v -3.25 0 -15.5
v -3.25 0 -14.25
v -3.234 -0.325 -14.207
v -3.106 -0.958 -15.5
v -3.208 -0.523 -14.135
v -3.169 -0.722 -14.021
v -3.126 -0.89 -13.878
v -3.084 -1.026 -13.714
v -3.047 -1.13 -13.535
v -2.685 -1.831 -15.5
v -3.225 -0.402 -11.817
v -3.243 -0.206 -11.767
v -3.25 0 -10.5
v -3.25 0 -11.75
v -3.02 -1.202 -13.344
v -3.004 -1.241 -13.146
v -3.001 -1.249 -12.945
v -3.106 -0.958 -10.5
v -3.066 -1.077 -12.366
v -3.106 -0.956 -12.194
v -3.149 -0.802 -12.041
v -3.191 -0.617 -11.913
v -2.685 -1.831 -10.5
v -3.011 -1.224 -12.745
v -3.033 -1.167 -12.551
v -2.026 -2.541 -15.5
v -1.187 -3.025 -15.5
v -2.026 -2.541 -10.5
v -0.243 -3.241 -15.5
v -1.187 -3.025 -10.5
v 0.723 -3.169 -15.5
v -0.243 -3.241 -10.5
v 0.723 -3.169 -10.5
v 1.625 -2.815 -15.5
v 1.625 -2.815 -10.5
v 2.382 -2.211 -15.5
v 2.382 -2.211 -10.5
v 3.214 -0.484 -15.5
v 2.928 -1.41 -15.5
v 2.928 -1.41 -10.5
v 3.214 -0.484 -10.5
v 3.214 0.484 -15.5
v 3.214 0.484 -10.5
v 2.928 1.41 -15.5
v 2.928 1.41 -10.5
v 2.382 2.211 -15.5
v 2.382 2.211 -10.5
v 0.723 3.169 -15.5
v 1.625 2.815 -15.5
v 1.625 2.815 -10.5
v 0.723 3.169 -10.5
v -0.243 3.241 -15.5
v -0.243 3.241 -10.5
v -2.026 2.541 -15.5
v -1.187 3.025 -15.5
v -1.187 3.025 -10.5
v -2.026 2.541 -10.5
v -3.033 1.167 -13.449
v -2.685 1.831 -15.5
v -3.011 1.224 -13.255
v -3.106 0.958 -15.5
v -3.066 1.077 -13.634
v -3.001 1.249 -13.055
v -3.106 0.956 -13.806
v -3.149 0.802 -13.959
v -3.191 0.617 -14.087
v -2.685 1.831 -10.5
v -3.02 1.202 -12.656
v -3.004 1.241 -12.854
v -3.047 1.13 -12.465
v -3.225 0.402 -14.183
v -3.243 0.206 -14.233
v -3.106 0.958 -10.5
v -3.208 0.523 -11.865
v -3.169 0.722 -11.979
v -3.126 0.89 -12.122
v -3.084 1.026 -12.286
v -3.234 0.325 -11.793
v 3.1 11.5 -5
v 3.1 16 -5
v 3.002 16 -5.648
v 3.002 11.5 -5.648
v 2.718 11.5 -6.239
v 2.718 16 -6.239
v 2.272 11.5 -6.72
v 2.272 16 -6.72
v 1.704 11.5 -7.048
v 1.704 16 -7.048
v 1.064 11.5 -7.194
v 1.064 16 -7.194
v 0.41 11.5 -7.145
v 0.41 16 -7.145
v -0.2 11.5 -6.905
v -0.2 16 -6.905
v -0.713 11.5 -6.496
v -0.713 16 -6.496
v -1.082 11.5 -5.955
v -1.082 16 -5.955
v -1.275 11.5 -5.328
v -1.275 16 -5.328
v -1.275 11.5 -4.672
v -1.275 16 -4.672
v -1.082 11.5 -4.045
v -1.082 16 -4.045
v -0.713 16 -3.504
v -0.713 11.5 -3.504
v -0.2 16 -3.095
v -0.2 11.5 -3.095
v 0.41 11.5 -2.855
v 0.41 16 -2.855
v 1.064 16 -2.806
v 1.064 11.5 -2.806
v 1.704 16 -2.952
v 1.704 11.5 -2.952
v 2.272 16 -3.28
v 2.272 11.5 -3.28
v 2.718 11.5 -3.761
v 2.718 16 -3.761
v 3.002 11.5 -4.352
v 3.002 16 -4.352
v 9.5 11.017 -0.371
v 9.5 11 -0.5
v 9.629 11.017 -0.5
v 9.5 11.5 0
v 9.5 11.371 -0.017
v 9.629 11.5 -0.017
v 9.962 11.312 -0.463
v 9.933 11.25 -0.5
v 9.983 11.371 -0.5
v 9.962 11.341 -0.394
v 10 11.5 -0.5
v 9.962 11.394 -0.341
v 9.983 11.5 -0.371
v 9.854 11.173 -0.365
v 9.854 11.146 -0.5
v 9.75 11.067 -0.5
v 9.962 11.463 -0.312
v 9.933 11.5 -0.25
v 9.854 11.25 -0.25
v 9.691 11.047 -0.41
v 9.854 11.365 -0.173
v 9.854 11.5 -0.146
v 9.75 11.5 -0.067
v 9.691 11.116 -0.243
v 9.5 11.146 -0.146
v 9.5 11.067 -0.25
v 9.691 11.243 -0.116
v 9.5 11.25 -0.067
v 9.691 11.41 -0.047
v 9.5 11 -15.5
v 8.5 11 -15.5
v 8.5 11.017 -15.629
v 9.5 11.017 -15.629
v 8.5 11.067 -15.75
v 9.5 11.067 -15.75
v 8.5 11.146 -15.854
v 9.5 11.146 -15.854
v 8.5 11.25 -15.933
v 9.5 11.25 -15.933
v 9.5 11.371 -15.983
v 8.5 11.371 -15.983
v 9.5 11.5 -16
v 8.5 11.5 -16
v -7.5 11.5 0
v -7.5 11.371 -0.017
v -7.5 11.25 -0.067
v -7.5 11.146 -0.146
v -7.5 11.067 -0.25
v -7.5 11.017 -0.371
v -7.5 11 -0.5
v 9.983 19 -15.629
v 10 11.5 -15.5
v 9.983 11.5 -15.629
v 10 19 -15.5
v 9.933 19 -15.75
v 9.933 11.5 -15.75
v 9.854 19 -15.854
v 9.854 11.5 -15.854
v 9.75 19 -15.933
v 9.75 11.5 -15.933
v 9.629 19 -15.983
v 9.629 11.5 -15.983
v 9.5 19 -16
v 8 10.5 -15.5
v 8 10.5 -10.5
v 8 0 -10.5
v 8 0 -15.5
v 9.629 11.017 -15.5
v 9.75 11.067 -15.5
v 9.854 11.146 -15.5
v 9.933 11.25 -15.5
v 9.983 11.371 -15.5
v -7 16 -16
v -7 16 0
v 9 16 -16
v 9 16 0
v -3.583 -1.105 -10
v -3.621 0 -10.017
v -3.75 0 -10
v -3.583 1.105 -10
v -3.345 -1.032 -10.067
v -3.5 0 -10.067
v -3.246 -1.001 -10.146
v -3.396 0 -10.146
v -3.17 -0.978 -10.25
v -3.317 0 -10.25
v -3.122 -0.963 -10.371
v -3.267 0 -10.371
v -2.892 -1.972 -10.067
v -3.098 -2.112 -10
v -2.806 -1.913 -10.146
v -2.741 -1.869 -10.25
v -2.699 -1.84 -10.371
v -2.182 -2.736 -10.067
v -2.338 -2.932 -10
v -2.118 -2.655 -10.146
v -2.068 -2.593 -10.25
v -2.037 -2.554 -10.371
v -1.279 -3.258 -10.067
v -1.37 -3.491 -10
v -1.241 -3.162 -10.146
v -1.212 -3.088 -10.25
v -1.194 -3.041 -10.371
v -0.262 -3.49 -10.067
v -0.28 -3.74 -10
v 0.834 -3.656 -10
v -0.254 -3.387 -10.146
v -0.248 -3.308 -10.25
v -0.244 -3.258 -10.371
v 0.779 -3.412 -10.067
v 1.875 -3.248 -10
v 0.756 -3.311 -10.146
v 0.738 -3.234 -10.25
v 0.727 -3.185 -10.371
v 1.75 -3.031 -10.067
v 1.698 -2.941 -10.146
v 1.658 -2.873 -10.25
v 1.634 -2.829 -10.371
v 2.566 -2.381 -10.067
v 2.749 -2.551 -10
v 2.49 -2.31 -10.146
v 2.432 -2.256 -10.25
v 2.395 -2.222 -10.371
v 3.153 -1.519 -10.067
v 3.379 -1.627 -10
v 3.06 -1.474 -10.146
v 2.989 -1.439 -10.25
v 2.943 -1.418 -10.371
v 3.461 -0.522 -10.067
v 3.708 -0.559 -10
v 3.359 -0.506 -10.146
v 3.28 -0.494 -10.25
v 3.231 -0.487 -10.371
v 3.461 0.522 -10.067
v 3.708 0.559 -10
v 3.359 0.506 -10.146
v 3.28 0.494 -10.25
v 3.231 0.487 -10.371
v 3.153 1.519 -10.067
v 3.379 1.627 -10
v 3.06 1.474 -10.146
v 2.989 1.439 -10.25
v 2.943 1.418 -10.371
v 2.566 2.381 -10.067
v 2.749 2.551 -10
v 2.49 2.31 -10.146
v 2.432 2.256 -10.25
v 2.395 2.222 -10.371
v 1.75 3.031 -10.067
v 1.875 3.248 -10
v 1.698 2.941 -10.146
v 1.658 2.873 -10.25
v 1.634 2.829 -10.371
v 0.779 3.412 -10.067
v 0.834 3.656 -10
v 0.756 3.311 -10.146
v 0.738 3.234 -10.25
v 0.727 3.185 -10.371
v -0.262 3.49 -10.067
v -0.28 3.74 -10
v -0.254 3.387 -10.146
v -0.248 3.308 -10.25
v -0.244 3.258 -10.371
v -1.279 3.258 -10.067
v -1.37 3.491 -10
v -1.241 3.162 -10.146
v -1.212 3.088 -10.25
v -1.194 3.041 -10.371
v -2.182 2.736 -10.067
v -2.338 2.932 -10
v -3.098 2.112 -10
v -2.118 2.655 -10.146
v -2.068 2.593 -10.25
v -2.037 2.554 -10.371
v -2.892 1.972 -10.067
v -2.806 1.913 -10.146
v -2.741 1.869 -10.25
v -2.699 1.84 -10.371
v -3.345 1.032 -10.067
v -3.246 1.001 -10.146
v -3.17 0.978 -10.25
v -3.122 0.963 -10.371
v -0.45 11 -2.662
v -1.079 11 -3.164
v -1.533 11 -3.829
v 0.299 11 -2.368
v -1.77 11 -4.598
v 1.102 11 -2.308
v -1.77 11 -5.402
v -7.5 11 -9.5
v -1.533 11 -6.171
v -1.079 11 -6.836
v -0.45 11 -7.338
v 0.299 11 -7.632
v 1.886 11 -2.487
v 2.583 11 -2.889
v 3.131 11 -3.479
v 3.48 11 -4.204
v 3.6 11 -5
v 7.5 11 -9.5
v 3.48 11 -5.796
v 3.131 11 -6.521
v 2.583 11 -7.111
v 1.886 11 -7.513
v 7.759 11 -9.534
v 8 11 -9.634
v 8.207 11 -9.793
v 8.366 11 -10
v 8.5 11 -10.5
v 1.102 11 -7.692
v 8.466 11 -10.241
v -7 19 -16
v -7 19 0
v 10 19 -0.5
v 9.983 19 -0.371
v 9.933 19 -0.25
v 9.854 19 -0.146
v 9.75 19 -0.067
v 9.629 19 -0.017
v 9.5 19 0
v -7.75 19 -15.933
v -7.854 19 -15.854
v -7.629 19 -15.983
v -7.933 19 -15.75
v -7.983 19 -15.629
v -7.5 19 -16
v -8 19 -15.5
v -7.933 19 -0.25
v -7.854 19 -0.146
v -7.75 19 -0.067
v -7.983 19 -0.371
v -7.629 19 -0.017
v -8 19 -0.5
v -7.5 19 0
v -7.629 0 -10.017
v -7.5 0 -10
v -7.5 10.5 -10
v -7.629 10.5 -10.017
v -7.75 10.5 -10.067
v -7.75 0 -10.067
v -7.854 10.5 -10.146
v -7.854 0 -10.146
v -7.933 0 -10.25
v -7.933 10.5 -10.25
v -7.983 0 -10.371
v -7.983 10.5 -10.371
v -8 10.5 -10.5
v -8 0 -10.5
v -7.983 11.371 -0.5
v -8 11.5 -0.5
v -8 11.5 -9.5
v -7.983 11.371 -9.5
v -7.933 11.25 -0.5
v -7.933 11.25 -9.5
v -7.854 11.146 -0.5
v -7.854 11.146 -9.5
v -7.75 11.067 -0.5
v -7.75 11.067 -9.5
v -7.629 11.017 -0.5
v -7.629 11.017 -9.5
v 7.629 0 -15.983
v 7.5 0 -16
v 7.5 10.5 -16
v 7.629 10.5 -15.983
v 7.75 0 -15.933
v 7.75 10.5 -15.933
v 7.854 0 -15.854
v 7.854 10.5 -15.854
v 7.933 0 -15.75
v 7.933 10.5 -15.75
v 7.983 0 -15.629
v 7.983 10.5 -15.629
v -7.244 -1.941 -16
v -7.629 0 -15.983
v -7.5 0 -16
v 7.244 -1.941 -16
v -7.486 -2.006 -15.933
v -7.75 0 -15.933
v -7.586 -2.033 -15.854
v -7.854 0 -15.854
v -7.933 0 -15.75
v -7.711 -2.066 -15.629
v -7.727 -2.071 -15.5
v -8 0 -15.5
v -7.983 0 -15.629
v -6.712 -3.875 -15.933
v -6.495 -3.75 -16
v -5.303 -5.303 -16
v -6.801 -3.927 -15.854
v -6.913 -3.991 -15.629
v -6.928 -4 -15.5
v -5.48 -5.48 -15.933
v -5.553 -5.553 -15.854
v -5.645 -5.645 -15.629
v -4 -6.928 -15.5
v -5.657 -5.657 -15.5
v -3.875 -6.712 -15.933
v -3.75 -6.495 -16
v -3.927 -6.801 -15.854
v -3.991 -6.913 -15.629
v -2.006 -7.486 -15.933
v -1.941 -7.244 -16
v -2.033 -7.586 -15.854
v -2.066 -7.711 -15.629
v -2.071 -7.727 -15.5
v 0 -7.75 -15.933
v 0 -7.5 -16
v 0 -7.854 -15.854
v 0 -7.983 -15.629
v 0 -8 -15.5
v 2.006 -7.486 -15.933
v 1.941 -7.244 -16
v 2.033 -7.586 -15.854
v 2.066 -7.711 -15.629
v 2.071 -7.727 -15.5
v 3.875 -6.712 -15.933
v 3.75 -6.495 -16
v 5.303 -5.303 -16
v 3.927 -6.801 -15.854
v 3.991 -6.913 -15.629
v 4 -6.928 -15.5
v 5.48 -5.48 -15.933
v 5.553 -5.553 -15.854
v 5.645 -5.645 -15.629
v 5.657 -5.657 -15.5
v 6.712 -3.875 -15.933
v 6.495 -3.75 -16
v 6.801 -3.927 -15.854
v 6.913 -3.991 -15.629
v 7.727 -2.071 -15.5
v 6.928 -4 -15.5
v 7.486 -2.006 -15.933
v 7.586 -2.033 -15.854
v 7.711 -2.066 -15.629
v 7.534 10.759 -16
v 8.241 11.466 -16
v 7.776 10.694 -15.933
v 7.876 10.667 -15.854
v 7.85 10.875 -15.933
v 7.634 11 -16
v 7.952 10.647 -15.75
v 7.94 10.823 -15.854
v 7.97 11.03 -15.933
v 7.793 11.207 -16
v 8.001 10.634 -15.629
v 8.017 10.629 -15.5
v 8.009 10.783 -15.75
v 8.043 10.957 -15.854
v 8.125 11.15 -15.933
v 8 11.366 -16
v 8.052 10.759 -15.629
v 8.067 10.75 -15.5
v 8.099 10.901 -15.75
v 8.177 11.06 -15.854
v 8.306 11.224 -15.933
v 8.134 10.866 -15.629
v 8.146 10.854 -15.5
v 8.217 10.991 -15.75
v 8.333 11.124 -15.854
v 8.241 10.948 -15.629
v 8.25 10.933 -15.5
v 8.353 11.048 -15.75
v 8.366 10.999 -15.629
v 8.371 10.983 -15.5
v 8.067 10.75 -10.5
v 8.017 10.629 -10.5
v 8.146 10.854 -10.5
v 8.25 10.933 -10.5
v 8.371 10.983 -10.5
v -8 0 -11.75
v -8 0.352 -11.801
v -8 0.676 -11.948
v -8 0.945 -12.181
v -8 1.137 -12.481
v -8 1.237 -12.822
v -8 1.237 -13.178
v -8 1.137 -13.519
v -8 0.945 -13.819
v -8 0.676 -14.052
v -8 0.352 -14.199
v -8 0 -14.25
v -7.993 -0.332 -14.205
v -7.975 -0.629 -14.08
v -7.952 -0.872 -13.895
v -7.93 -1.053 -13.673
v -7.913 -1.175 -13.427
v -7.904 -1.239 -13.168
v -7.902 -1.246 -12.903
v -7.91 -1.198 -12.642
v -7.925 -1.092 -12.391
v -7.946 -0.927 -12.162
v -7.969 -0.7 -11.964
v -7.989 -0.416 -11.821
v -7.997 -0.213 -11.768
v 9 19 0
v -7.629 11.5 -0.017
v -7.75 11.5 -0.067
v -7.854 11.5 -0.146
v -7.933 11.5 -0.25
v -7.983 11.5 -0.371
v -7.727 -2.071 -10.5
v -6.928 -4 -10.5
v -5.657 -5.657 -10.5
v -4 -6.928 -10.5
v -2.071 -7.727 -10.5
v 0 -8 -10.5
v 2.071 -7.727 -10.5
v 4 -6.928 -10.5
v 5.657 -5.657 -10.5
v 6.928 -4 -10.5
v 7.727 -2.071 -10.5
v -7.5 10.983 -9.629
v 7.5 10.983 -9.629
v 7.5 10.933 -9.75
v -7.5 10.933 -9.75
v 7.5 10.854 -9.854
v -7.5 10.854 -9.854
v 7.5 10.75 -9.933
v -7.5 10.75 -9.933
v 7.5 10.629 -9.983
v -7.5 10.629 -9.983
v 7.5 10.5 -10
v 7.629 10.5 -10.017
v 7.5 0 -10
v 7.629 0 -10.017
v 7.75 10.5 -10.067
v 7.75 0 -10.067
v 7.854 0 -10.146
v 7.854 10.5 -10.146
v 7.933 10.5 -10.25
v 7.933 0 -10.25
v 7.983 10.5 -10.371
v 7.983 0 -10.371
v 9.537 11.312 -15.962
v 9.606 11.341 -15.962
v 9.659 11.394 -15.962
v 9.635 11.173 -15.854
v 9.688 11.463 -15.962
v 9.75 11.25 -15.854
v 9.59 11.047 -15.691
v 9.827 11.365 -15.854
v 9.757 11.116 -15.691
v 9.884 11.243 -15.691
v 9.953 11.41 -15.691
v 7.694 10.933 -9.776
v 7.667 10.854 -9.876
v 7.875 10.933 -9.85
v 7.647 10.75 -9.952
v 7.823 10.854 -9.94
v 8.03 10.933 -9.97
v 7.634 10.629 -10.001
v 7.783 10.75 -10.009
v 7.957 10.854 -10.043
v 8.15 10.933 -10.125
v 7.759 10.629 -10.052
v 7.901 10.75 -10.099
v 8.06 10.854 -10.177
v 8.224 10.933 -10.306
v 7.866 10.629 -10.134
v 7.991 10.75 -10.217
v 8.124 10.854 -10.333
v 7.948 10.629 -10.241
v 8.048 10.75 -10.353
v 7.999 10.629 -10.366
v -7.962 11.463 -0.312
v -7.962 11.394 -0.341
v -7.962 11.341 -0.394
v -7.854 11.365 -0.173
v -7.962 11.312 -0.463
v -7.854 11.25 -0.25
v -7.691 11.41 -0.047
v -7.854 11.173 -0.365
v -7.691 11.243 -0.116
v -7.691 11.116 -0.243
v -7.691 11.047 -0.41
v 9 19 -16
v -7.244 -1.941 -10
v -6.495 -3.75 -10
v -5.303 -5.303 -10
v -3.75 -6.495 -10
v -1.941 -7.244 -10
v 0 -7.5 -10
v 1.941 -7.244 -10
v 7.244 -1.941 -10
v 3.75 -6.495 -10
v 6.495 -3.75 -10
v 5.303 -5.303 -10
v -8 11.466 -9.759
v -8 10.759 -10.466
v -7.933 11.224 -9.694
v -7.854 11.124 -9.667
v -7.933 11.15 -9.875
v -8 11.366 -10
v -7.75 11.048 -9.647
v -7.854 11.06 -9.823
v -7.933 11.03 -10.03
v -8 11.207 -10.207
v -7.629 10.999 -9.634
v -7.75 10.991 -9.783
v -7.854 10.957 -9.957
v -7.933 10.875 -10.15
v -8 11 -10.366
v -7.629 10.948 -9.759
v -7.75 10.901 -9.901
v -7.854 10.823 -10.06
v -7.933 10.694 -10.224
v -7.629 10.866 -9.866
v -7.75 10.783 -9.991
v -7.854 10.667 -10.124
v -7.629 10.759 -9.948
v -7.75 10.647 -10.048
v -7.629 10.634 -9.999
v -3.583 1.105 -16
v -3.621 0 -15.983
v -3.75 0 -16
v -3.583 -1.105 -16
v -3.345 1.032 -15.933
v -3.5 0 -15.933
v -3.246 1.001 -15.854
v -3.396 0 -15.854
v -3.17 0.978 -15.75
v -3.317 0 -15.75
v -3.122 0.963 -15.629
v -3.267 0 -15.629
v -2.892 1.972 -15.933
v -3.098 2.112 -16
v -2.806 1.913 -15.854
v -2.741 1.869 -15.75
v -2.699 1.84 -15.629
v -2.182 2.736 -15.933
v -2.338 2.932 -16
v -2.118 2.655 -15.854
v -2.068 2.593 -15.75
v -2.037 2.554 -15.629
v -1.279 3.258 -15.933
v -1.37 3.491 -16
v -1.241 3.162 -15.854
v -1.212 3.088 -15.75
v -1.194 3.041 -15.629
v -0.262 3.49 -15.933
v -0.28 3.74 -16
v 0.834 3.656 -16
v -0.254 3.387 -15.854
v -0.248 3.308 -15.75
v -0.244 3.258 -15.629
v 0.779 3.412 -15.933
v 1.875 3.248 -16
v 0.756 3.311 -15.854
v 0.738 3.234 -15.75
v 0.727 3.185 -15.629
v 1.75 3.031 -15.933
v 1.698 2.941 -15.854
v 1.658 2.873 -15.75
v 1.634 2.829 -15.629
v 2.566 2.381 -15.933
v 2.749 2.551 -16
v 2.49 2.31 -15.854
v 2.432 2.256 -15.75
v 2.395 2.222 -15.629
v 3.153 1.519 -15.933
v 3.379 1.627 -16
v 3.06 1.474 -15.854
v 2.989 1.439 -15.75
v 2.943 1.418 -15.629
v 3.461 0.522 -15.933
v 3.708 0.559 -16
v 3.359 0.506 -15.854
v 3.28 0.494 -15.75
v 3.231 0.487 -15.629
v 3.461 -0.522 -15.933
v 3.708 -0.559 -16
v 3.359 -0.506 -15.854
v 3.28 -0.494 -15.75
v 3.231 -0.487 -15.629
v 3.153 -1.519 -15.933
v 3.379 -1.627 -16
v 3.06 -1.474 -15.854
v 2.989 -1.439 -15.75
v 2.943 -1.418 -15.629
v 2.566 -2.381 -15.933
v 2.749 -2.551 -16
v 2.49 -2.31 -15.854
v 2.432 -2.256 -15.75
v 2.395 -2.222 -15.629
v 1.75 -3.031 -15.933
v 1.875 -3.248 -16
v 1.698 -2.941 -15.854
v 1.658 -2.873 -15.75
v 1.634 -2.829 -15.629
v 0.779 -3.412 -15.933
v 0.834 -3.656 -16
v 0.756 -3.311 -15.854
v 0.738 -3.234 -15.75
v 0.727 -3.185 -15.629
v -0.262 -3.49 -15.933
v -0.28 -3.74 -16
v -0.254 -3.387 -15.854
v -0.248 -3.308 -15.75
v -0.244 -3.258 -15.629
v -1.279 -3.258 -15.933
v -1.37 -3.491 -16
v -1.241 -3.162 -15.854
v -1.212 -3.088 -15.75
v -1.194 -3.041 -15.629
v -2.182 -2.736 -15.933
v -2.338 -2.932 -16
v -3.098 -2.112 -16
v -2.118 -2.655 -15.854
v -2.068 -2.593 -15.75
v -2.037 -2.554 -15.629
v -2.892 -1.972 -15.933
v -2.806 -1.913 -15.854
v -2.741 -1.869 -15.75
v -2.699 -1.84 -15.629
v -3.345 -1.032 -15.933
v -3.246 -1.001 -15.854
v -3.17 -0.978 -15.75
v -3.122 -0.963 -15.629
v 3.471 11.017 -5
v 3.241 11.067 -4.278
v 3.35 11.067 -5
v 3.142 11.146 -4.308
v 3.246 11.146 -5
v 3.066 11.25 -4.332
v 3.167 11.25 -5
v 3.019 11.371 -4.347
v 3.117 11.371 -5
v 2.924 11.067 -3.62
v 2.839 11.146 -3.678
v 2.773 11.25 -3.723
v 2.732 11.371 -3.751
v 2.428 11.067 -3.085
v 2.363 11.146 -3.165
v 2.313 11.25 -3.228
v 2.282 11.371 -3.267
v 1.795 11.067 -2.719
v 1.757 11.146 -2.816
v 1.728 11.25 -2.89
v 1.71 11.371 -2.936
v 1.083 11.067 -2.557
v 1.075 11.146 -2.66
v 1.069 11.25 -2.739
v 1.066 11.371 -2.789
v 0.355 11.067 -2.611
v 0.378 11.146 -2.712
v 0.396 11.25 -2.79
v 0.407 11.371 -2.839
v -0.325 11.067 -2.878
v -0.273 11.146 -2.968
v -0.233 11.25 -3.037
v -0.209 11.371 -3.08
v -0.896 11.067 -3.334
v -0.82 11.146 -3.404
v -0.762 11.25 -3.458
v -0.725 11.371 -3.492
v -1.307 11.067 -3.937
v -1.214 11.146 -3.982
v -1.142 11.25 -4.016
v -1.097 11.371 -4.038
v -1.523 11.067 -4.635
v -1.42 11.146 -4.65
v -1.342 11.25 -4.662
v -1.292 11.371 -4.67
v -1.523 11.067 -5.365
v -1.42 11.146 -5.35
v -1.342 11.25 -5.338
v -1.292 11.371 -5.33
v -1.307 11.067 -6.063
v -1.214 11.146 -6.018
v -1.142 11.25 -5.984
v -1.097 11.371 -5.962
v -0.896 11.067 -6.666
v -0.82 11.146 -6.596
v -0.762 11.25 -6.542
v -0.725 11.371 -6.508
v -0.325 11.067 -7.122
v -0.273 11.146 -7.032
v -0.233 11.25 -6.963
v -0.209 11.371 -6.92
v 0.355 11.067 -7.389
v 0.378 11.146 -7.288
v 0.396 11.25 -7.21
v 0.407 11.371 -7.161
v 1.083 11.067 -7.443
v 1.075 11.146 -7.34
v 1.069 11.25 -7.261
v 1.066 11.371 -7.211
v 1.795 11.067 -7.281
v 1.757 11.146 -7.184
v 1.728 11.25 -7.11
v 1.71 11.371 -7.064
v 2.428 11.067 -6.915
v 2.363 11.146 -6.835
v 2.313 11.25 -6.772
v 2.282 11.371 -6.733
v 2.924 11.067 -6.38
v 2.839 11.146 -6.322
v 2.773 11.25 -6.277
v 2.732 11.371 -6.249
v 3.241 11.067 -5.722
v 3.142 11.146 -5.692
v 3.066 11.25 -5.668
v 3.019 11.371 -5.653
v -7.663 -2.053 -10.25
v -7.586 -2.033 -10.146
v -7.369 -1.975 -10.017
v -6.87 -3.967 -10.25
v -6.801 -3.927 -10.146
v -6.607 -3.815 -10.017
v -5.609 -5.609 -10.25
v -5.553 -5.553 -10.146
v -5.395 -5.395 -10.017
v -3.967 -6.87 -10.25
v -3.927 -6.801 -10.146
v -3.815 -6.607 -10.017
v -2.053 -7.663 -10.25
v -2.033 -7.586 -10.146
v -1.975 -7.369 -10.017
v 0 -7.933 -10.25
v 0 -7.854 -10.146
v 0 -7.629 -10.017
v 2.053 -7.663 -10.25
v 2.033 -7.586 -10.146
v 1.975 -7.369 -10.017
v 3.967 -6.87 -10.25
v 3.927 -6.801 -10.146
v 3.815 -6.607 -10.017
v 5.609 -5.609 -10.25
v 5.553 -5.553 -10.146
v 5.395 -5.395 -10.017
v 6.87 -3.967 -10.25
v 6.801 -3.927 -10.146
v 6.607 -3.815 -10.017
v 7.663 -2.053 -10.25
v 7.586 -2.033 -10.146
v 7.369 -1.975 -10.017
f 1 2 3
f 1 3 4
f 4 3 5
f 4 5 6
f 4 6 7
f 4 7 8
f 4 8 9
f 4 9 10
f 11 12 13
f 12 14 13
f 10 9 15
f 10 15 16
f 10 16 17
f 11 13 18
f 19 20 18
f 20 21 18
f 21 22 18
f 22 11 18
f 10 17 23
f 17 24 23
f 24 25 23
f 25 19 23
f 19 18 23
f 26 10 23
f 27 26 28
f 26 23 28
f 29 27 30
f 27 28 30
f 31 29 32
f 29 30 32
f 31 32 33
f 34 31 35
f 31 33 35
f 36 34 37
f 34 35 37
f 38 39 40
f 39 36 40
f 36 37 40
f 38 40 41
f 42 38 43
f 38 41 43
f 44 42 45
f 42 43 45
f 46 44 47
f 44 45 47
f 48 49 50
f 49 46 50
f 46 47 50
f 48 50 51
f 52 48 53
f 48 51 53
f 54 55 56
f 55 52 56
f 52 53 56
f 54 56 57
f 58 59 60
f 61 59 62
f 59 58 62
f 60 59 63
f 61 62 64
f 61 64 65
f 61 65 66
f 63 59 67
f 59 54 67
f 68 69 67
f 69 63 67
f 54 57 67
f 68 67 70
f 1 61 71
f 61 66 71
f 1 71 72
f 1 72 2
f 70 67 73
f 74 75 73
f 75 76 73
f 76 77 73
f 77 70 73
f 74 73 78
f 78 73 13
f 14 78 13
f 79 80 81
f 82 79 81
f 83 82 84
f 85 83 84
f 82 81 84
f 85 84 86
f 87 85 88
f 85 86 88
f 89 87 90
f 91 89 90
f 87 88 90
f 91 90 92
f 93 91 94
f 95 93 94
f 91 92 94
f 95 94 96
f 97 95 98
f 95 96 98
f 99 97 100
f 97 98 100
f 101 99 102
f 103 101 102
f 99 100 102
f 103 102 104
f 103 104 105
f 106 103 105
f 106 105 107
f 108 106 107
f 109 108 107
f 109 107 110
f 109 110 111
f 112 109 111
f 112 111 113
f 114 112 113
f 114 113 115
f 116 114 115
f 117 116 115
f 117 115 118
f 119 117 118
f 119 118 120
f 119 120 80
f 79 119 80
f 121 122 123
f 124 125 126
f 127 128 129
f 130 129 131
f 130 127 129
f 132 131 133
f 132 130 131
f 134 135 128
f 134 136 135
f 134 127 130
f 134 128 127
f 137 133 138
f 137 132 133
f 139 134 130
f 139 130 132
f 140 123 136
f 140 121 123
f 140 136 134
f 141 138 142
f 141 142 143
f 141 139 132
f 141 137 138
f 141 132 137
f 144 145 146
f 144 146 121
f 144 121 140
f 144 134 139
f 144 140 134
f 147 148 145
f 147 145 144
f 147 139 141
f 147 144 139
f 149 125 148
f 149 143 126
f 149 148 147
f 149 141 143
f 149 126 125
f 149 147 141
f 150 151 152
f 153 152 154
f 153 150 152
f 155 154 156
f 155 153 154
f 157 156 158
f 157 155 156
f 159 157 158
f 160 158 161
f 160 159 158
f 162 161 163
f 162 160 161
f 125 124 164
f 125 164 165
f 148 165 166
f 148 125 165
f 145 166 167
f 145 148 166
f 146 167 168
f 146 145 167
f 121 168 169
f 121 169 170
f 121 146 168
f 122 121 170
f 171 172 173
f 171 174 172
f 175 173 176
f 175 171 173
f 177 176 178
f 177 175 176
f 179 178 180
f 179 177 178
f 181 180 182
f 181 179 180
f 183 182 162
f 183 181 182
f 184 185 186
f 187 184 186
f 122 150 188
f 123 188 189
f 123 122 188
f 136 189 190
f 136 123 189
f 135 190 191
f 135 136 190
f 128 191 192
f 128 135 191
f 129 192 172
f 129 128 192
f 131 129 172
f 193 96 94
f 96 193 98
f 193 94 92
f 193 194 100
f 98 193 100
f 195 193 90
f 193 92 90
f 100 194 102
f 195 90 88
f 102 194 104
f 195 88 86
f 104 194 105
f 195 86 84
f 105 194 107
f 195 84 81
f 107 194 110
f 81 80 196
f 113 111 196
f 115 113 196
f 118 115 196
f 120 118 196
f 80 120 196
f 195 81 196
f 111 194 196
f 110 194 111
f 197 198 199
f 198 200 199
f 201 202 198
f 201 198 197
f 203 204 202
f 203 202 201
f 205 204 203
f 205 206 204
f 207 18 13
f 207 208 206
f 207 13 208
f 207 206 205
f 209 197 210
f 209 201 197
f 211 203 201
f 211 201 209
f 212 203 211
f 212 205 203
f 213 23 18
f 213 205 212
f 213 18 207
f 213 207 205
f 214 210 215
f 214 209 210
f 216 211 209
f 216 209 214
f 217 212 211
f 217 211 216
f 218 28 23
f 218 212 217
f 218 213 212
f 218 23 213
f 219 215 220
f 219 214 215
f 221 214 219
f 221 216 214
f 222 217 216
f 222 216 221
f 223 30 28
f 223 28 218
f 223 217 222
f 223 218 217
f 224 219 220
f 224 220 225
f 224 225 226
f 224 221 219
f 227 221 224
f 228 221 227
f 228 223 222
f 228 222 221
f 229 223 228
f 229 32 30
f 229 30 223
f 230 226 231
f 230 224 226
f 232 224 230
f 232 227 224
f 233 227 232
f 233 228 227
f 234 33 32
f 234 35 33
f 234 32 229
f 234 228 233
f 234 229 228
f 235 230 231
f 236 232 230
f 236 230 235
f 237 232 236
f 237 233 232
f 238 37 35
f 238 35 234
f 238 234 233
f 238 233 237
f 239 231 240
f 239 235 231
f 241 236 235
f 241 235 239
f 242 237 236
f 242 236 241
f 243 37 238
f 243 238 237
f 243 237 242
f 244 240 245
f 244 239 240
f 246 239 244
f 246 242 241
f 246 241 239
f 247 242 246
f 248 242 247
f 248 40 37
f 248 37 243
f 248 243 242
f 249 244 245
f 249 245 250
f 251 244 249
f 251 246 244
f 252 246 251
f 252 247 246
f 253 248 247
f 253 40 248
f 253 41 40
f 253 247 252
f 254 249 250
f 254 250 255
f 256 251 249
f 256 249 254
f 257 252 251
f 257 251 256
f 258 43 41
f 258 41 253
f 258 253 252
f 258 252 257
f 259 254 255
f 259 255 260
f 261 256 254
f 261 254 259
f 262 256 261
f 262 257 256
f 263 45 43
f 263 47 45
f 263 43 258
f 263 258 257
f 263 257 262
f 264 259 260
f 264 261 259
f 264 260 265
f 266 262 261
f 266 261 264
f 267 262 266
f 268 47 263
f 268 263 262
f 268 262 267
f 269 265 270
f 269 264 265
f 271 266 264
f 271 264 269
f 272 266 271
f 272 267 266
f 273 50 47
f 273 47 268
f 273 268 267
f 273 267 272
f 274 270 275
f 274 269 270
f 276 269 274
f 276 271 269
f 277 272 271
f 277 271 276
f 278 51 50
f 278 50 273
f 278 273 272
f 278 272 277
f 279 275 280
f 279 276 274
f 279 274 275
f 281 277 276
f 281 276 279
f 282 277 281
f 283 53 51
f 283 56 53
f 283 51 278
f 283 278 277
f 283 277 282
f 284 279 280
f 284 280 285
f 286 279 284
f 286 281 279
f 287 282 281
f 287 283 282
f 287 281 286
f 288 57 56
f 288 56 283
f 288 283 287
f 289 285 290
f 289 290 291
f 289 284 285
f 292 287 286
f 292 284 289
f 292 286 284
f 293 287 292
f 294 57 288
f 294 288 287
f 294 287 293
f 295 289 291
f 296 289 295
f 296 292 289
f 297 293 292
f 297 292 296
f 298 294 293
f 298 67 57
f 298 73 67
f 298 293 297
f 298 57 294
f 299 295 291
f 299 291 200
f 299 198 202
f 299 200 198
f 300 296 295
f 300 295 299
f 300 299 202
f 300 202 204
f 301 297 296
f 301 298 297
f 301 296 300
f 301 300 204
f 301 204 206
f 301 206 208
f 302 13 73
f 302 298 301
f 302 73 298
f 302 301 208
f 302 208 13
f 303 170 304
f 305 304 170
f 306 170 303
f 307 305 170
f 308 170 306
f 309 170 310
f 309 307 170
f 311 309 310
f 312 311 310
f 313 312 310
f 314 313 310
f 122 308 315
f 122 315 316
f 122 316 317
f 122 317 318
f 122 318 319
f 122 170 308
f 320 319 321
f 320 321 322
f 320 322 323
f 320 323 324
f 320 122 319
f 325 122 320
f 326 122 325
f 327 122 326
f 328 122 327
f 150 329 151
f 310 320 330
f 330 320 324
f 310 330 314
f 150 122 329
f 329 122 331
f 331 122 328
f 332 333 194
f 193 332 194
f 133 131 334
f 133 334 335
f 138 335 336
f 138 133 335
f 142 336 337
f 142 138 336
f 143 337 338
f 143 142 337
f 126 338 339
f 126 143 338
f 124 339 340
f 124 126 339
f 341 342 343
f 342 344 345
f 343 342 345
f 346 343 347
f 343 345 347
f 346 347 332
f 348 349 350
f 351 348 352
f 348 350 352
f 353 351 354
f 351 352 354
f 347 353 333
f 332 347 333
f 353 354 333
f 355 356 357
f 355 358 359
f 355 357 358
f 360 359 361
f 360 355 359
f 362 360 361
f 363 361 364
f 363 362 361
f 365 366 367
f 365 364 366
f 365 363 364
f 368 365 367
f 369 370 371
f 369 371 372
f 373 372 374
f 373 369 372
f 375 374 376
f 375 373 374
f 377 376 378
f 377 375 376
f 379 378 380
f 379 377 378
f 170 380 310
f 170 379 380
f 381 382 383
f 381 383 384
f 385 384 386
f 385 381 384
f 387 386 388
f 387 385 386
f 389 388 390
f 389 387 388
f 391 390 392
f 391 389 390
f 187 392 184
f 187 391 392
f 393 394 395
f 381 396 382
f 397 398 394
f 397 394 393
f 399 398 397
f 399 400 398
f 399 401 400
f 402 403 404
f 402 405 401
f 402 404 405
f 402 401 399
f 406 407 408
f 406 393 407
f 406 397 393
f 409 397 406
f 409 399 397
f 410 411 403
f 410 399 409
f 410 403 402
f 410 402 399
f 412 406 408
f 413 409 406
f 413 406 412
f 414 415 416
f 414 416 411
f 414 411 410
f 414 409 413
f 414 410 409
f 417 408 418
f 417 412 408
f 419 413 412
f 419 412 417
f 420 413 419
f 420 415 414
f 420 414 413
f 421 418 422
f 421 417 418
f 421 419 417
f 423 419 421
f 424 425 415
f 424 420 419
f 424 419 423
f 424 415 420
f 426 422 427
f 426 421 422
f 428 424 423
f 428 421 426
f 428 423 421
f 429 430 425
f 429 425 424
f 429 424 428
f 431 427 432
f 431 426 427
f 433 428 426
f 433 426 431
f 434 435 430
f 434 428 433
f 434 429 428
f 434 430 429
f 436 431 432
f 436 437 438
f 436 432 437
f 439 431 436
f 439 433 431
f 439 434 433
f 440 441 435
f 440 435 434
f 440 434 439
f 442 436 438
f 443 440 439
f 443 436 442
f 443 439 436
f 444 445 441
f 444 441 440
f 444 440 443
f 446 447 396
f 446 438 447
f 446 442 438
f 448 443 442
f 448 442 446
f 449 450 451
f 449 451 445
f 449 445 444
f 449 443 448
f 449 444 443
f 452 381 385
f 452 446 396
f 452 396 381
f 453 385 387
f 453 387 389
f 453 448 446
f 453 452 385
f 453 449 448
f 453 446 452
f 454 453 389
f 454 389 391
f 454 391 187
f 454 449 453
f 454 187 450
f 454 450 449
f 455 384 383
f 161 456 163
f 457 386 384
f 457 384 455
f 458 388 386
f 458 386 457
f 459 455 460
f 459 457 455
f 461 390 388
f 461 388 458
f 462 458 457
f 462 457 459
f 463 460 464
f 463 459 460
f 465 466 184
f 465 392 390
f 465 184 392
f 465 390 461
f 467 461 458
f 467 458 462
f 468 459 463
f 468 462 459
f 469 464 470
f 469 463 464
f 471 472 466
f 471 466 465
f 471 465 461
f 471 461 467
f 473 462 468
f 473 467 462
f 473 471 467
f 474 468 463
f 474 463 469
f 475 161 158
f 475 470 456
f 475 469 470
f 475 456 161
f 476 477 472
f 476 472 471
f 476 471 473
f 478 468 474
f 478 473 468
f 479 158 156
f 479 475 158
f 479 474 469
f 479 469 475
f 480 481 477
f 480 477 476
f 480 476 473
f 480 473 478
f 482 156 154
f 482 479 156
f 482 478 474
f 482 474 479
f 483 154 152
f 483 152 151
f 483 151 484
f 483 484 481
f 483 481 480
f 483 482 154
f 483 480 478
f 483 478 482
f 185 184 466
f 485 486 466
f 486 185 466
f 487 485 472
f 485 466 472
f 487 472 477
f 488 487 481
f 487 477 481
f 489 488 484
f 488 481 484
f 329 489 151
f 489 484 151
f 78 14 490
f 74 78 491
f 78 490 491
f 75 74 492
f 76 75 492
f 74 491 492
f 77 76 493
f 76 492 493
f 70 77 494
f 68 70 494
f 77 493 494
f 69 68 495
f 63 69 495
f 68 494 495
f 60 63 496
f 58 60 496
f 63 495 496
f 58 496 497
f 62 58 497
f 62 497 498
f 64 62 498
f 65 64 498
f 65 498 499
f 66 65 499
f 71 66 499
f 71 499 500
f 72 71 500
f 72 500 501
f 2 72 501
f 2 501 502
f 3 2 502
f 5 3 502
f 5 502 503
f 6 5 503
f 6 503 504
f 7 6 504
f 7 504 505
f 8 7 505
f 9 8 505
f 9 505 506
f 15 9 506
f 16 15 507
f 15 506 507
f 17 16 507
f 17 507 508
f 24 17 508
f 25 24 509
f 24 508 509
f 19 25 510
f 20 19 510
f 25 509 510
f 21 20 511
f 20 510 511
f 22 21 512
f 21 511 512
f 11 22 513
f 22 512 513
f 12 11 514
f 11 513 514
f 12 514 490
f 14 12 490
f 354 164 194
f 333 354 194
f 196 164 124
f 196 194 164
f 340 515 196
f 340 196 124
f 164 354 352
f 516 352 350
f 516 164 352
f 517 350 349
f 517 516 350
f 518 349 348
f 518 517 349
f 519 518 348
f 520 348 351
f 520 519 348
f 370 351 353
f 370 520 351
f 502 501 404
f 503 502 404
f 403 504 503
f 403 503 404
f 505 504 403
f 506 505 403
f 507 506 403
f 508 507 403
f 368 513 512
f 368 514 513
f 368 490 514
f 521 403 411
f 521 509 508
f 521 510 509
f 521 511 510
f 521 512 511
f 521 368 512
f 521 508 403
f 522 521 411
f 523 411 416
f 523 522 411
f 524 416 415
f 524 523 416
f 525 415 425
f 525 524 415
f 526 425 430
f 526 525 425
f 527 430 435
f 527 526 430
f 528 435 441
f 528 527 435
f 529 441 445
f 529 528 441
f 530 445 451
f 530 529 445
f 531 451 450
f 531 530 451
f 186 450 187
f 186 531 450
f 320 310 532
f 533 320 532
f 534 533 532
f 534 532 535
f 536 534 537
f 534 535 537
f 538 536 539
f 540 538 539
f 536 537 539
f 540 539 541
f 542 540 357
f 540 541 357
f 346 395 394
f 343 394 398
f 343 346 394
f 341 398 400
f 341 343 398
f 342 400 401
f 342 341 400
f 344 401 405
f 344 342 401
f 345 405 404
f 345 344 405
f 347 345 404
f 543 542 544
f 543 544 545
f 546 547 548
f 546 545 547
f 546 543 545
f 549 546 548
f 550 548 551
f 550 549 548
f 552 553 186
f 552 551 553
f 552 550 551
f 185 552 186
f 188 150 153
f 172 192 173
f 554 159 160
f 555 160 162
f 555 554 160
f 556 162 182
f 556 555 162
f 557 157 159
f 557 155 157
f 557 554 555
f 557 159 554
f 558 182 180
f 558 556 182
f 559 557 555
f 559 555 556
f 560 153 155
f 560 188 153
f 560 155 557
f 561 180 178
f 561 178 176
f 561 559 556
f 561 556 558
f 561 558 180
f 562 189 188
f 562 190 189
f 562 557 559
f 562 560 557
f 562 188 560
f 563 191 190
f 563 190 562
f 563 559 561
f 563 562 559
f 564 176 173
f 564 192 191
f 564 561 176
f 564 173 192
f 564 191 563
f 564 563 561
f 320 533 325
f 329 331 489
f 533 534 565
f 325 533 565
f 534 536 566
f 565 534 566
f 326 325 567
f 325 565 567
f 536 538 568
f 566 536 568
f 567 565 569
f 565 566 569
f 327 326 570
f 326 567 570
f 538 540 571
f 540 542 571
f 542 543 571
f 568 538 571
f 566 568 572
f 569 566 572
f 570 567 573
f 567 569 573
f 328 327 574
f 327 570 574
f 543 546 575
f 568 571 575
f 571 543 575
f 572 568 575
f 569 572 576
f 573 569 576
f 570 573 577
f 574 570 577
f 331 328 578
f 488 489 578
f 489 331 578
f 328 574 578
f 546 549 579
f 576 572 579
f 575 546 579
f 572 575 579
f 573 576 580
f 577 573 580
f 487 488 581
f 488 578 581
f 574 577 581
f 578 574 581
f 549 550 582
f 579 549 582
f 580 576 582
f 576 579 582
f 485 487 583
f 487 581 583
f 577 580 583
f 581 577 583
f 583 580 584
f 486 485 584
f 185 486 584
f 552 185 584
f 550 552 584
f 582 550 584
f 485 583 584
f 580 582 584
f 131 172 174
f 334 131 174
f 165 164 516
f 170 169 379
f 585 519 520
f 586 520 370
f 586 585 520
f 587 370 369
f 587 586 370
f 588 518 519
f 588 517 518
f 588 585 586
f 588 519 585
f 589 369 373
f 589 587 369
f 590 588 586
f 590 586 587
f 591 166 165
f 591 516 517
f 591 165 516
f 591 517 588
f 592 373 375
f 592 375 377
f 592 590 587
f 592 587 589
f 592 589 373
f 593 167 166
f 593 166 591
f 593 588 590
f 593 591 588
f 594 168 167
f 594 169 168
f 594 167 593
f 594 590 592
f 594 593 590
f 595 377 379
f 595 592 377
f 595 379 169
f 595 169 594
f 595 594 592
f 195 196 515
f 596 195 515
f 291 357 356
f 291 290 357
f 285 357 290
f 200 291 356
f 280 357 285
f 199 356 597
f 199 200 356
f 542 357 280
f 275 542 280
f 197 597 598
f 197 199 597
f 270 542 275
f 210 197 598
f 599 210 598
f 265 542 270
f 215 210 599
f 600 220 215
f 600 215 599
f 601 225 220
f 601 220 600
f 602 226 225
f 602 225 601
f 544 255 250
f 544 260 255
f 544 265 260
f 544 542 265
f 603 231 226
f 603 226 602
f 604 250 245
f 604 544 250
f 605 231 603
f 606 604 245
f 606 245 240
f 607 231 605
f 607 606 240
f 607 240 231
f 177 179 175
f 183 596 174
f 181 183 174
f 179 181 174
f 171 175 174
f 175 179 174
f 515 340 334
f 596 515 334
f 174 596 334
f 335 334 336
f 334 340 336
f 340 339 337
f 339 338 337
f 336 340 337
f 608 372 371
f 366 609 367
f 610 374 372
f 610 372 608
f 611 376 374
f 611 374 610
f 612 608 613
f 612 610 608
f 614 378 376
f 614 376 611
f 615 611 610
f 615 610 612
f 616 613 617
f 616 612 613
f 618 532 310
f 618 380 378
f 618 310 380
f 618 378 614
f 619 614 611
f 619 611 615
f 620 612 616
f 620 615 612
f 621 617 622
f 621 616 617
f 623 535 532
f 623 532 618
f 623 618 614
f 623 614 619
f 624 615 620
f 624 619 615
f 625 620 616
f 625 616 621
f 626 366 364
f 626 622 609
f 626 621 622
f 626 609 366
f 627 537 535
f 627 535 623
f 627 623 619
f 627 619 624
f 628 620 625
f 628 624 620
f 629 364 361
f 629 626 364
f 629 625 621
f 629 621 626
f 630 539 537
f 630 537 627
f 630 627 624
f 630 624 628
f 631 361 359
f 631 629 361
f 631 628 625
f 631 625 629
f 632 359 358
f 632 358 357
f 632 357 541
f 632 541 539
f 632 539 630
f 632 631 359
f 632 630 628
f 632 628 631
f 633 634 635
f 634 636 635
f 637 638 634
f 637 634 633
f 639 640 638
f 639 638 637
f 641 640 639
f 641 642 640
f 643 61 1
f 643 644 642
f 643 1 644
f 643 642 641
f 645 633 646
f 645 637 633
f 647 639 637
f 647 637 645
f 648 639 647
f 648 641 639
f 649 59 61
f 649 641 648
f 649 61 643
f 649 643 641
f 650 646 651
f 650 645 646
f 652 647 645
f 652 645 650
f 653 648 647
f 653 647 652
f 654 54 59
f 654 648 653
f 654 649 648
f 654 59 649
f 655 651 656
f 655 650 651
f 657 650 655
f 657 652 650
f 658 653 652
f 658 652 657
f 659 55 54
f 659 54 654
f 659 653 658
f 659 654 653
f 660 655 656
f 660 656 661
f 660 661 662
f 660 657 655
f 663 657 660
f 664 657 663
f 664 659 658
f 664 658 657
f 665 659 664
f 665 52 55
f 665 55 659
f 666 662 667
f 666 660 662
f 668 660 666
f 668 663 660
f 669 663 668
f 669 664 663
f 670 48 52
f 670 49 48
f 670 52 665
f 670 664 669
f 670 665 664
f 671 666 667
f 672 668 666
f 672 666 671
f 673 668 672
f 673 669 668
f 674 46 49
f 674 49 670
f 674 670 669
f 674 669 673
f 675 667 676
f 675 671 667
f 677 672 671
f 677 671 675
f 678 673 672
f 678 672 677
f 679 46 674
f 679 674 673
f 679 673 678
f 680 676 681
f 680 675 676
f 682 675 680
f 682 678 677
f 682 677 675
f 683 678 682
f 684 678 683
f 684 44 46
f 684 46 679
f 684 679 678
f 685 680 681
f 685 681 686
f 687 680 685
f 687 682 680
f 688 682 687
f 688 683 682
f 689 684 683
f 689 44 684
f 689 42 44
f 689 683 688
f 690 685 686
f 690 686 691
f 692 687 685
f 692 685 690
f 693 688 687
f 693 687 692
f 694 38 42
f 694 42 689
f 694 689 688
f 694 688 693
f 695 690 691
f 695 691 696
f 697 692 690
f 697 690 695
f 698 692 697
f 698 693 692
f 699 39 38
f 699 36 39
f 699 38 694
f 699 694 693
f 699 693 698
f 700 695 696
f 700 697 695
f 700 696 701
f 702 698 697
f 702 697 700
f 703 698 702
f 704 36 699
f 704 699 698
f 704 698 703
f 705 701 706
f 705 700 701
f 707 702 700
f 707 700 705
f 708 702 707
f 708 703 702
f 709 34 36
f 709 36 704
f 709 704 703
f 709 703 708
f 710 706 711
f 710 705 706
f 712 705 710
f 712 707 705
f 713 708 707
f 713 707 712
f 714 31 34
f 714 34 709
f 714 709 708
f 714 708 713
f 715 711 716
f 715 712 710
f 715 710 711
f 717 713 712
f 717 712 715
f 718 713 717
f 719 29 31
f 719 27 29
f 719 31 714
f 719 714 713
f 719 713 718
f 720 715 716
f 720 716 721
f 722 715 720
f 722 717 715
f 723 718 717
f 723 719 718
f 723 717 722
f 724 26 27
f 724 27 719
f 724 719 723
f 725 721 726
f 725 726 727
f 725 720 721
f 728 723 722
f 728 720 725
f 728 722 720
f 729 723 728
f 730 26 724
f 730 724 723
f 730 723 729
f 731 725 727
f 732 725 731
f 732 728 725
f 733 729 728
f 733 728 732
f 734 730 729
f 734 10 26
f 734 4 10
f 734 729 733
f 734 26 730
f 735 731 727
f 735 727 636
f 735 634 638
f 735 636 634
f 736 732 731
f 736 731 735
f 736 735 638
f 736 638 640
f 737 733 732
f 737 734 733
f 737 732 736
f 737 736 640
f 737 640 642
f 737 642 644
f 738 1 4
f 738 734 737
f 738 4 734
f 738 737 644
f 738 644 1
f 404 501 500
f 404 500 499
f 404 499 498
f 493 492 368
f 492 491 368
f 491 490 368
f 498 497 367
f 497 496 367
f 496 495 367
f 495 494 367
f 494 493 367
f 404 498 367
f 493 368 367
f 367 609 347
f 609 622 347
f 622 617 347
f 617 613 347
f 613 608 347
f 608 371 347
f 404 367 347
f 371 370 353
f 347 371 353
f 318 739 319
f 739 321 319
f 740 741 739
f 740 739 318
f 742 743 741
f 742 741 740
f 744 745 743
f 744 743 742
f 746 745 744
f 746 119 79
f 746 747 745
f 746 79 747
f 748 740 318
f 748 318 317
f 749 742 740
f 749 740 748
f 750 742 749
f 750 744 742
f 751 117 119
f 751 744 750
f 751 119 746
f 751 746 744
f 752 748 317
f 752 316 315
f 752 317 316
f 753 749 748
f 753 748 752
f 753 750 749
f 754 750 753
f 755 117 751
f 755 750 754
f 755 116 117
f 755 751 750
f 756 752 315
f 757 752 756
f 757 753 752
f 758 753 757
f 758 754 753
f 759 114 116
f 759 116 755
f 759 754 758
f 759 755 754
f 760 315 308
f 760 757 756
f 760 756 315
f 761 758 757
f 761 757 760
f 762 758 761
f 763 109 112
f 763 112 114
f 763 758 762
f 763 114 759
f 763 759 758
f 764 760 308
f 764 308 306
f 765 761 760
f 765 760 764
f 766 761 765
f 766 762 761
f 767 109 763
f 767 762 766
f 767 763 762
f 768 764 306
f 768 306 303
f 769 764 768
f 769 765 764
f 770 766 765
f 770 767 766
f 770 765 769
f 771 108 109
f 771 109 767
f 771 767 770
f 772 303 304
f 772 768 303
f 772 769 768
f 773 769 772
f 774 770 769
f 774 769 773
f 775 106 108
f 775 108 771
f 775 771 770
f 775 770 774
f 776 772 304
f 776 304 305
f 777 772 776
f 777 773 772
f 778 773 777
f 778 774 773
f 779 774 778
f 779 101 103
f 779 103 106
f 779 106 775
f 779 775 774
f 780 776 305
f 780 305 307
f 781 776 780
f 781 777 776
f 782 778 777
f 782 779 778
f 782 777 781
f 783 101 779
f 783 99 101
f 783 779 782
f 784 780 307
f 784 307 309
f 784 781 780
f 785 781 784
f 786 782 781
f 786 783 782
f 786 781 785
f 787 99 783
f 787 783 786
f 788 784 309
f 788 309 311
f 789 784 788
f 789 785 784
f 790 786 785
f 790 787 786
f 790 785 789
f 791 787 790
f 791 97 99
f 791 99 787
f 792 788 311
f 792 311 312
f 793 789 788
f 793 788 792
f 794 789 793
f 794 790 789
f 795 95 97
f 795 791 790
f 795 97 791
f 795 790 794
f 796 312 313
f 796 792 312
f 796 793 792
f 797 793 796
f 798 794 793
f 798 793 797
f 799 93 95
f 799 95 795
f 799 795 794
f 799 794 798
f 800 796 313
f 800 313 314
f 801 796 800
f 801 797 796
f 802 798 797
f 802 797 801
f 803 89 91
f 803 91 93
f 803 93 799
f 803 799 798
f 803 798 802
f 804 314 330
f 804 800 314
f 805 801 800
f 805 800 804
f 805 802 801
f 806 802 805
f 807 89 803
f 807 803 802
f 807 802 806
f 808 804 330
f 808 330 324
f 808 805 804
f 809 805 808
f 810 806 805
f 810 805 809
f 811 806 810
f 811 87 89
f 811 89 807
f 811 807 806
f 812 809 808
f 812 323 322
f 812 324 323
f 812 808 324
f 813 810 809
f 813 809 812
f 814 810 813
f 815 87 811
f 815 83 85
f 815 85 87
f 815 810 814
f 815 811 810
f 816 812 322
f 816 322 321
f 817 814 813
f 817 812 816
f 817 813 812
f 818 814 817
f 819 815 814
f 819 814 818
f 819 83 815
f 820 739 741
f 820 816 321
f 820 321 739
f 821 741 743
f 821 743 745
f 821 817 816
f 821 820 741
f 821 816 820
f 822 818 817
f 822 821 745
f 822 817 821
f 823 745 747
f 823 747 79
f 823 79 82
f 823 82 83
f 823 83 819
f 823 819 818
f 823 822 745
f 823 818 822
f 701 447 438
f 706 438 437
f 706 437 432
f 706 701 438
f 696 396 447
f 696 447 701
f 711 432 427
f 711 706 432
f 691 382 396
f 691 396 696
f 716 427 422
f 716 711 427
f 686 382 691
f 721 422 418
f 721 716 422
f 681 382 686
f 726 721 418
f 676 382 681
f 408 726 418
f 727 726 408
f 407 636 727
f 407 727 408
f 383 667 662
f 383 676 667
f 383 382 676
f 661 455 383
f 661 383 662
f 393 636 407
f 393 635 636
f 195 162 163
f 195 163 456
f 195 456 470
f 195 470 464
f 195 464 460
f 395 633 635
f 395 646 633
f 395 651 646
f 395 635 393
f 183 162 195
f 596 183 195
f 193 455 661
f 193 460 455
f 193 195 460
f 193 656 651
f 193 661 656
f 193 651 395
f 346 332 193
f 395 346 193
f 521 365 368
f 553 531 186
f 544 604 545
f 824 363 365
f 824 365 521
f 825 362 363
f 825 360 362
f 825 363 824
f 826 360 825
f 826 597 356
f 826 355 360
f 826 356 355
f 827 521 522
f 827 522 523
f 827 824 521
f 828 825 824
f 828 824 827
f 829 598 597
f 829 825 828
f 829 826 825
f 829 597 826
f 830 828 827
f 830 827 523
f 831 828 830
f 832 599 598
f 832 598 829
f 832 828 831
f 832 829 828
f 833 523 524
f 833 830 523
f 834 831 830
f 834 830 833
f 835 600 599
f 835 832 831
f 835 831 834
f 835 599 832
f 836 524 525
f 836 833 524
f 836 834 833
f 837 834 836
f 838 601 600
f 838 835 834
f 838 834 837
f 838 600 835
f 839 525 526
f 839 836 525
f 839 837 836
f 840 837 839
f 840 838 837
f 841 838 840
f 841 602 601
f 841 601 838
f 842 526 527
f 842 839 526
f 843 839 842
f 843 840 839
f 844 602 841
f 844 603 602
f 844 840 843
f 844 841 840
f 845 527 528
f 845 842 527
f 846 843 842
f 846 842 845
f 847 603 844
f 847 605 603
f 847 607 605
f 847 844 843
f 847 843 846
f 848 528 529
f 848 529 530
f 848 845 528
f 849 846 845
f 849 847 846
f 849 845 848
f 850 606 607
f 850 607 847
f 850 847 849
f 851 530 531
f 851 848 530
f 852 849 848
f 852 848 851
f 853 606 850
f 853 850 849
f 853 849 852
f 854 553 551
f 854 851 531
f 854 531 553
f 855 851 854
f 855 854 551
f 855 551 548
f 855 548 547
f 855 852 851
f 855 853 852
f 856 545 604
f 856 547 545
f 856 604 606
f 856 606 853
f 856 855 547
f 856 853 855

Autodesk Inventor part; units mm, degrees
sketch "Sketch1" plane through (0, 0, 0) normal (0, 0, 1) x (1, 0, 0)
  circle A0 centre (0, 0) radius 3.25
  circle A1 centre (0, 0) radius 8
  dimension "d0" = 6.5
  dimension "d1" = 16
extrude "Extrusion1" add sketch "Sketch1" along normal blind 6
sketch "Sketch2" plane through (0, 0, 0) normal (1, 0, 0) x (0, 1, 0)
  circle A0 centre (0, 2.5) radius 1.25
  point P0 (0, 0)
  dimension "d4" = 2.5
extrude "Extrusion2" cut sketch "Sketch2" against normal blind 20
ref_plane "Work Plane1" through (0, 0, 6) normal (0, 0, 1) x (1, 0, 0)
sketch "Sketch3" plane through (0, 0, 6) normal (0, 0, 1) x (1, 0, 0)
  circle A0 centre (0, 0) radius 7.5 projected
  line L0 (-8, 0) -> (8, 0)
  line L1 (8, 0) -> (8, 19)
  line L2 (8, 19) -> (-8, 19)
  line L3 (-8, 19) -> (-8, 0)
  dimension "d9" = 16
  dimension "d10" = 19
  dimension "d11" = 8
  dimension "d17" = 0
extrude "Extrusion3" add sketch "Sketch3" against normal blind 6 contours L0 A0 | A0 L0 L3 L2 L1 picked at (-1.3085, 5.1375)
sketch "Sketch4" plane through (0, 0, 0) normal (0, 0, -1) x (-1, 0, 0)
  line L0 (8, 0) -> (8, 19) projected
  line L1 (-8, 19) -> (8, 19)
  line L2 (8, 19) -> (8, 11)
  line L3 (8, 11) -> (-8, 11)
  line L4 (-8, 11) -> (-8, 19)
  dimension "d14" = 8
extrude "Extrusion4" add sketch "Sketch4" along normal blind 10
ref_plane "Work Plane4" through (-8, 19, 6) normal (0, 1, 0) x (1, 0, 0)
sketch "Sketch5" plane through (-8, 19, 6) normal (0, 1, 0) x (1, 0, 0)
  line L0 (16, 0) -> (16, 16) projected
  line L1 (0, 16) -> (16, 16) projected
  circle A0 centre (8.9, 11) radius 2.2
  point P0 (8, 6)
  dimension "d18" = 4.4
  dimension "d19" = 7.1
  dimension "d20" = 5
extrude "Extrusion5" cut sketch "Sketch5" against normal blind 10
ref_plane "Work Plane3" through (8, 0, 6) normal (1, 0, 0) x (0, 0, -1)
sketch "Sketch6" plane through (8, 0, 6) normal (1, 0, 0) x (0, 0, -1)
  line L0 (16, 19) -> (16, 11) projected
  line L1 (0, 19) -> (16, 19) projected
  line L2 (0, 19) -> (16, 19)
  line L3 (16, 19) -> (16, 11)
  line L4 (16, 11) -> (0, 11)
  line L5 (0, 11) -> (0, 19)
extrude "Extrusion6" add sketch "Sketch6" along normal blind 2
ref_plane "Work Plane5" through (-8, 19, 6) normal (0, 1, 0) x (1, 0, 0)
sketch "Sketch7" plane through (-8, 19, 6) normal (0, 1, 0) x (1, 0, 0)
  circle A0 centre (8.9, 11) radius 2.2 projected
  line L0 (18, 0) -> (0, 0) projected
  line L1 (18, 16) -> (18, 0) projected
  line L2 (0, 16) -> (18, 16) projected
  line L3 (17, 0) -> (1, 0)
  line L4 (1, 0) -> (1, 16)
  line L5 (1, 16) -> (17, 16)
  line L6 (17, 16) -> (17, 0)
  point P0 (8, 6)
  dimension "d25" = 16
  dimension "d26" = 1
extrude "Extrusion7" cut sketch "Sketch7" against normal blind 3 contours L0 L4 L2 L6
sketch "Sketch8" plane through (0, 0, 0) normal (0, 0, -1) x (-1, 0, 0)
  arc A0 (-3.75, 0) -> (3.75, 0) centre (0, 0) ccw projected
  circle A1 centre (0, 0) radius 3.25
  dimension "d29" = 6.5
extrude "Extrusion8" cut sketch "Sketch8" against normal through all
ref_plane "Work Plane2" through (-8, 0, 0.75) normal (-1, 0, 0) x (0, 0, 1)
sketch "Sketch9" plane through (-8, 0, 0.75) normal (-1, 0, 0) x (0, 0, 1)
  line L0 (3.5, 0) -> (0, 0) projected
  circle A0 centre (1.75, 0) radius 1.25
  point P0 (-0.75, 0)
  dimension "d35" = 2.5
extrude "Extrusion9" cut sketch "Sketch9" against normal blind 8
sketch "Sketch11" plane through (0, 0, -10) normal (0, 0, -1) x (-1, 0, 0)
  line L0 (-9, 16) -> (-9, 19) projected
  line L1 (8, 19) -> (-10, 19) projected
  line L2 (-10, 11) -> (-10, 19) projected
  line L3 (8, 11) -> (-10, 11) projected
  line L4 (8, 11) -> (8, 19) projected
  line L5 (8, 19) -> (7, 19) projected
  line L6 (7, 19) -> (7, 16) projected
  line L7 (7, 16) -> (-9, 16) projected
  point P0 (0, 0)
  point P1 (-8, 19)
  point P2 (-8, 11)
extrude "Extrusion10" add sketch "Sketch11" along normal blind 6 contours L7 L6 L1 L4 L3 L2 L0
sketch "Sketch13" plane through (0, 0, 0) normal (0, 0, -1) x (-1, 0, 0)
  circle A0 centre (0, 0) radius 3.25 projected
  line L0 (8, 11) -> (-8, 11) projected
  line L1 (-8, 11) -> (-8, 0) projected
  arc A1 (-8, 0) -> (8, 0) centre (0, 0) ccw projected
  line L2 (8, 0) -> (8, 11) projected
extrude "Extrusion11" add sketch "Sketch13" along normal blind 16
sketch "Sketch15" plane through (8, 0, 6) normal (1, 0, 0) x (0, 0, -1)
  line L0 (0, 11) -> (16, 11)
  line L1 (16, 11) -> (16, -8.6618)
  line L2 (16, -8.6618) -> (0, -8.6618)
  line L3 (0, -8.6618) -> (0, 11)
  point P0 (6, 0)
  dimension "d43" = 16
extrude "Extrusion12" cut sketch "Sketch15" against normal blind 16
sketch "Sketch16" plane through (-8, 11, 6) normal (-1, 0, 0) x (0, 0, 1)
  line L0 (-22, -11) -> (-16, -11) projected
  circle A0 centre (-19, -11) radius 1.25
  point P0 (-6, -11)
  dimension "d46" = 2.5
extrude "Extrusion13" cut sketch "Sketch16" against normal blind 7
sketch "Sketch17" plane through (0, 0, 6) normal (0, 0, 1) x (1, 0, 0)
  line L0 (-8, 11) -> (10, 11) projected
  line L1 (10, 19) -> (10, 11) projected
  line L2 (10, 19) -> (9, 19) projected
  line L3 (9, 19) -> (9, 16) projected
  line L4 (9, 16) -> (-7, 16) projected
  line L5 (-7, 16) -> (-7, 19) projected
  line L6 (-7, 19) -> (-8, 19) projected
  line L7 (-8, 19) -> (-8, 11) projected
  point P0 (0, 0)
extrude "Extrusion14" cut sketch "Sketch17" against normal blind 6
fillet "Fillet9" radius 0.5 18 edges at (1, 11, 0) (-8, 15, 0) (10, 15, 0) (10, 11, -8) (0, 11, -10) (0, -8, -10) (-8, 5.5, -10) (8, 5.5, -10) (8, 11, -13) (9, 11, -16) (0, -8, -16) (-8, 9.5, -16) (8, 5.5, -16) (10, 15, -16) (-8, 11, -5) (-1.3, 11, -5) (3.25, 0, -10) (3.25, 0, -16)
properties part number "6mmRingBracketLeft"
